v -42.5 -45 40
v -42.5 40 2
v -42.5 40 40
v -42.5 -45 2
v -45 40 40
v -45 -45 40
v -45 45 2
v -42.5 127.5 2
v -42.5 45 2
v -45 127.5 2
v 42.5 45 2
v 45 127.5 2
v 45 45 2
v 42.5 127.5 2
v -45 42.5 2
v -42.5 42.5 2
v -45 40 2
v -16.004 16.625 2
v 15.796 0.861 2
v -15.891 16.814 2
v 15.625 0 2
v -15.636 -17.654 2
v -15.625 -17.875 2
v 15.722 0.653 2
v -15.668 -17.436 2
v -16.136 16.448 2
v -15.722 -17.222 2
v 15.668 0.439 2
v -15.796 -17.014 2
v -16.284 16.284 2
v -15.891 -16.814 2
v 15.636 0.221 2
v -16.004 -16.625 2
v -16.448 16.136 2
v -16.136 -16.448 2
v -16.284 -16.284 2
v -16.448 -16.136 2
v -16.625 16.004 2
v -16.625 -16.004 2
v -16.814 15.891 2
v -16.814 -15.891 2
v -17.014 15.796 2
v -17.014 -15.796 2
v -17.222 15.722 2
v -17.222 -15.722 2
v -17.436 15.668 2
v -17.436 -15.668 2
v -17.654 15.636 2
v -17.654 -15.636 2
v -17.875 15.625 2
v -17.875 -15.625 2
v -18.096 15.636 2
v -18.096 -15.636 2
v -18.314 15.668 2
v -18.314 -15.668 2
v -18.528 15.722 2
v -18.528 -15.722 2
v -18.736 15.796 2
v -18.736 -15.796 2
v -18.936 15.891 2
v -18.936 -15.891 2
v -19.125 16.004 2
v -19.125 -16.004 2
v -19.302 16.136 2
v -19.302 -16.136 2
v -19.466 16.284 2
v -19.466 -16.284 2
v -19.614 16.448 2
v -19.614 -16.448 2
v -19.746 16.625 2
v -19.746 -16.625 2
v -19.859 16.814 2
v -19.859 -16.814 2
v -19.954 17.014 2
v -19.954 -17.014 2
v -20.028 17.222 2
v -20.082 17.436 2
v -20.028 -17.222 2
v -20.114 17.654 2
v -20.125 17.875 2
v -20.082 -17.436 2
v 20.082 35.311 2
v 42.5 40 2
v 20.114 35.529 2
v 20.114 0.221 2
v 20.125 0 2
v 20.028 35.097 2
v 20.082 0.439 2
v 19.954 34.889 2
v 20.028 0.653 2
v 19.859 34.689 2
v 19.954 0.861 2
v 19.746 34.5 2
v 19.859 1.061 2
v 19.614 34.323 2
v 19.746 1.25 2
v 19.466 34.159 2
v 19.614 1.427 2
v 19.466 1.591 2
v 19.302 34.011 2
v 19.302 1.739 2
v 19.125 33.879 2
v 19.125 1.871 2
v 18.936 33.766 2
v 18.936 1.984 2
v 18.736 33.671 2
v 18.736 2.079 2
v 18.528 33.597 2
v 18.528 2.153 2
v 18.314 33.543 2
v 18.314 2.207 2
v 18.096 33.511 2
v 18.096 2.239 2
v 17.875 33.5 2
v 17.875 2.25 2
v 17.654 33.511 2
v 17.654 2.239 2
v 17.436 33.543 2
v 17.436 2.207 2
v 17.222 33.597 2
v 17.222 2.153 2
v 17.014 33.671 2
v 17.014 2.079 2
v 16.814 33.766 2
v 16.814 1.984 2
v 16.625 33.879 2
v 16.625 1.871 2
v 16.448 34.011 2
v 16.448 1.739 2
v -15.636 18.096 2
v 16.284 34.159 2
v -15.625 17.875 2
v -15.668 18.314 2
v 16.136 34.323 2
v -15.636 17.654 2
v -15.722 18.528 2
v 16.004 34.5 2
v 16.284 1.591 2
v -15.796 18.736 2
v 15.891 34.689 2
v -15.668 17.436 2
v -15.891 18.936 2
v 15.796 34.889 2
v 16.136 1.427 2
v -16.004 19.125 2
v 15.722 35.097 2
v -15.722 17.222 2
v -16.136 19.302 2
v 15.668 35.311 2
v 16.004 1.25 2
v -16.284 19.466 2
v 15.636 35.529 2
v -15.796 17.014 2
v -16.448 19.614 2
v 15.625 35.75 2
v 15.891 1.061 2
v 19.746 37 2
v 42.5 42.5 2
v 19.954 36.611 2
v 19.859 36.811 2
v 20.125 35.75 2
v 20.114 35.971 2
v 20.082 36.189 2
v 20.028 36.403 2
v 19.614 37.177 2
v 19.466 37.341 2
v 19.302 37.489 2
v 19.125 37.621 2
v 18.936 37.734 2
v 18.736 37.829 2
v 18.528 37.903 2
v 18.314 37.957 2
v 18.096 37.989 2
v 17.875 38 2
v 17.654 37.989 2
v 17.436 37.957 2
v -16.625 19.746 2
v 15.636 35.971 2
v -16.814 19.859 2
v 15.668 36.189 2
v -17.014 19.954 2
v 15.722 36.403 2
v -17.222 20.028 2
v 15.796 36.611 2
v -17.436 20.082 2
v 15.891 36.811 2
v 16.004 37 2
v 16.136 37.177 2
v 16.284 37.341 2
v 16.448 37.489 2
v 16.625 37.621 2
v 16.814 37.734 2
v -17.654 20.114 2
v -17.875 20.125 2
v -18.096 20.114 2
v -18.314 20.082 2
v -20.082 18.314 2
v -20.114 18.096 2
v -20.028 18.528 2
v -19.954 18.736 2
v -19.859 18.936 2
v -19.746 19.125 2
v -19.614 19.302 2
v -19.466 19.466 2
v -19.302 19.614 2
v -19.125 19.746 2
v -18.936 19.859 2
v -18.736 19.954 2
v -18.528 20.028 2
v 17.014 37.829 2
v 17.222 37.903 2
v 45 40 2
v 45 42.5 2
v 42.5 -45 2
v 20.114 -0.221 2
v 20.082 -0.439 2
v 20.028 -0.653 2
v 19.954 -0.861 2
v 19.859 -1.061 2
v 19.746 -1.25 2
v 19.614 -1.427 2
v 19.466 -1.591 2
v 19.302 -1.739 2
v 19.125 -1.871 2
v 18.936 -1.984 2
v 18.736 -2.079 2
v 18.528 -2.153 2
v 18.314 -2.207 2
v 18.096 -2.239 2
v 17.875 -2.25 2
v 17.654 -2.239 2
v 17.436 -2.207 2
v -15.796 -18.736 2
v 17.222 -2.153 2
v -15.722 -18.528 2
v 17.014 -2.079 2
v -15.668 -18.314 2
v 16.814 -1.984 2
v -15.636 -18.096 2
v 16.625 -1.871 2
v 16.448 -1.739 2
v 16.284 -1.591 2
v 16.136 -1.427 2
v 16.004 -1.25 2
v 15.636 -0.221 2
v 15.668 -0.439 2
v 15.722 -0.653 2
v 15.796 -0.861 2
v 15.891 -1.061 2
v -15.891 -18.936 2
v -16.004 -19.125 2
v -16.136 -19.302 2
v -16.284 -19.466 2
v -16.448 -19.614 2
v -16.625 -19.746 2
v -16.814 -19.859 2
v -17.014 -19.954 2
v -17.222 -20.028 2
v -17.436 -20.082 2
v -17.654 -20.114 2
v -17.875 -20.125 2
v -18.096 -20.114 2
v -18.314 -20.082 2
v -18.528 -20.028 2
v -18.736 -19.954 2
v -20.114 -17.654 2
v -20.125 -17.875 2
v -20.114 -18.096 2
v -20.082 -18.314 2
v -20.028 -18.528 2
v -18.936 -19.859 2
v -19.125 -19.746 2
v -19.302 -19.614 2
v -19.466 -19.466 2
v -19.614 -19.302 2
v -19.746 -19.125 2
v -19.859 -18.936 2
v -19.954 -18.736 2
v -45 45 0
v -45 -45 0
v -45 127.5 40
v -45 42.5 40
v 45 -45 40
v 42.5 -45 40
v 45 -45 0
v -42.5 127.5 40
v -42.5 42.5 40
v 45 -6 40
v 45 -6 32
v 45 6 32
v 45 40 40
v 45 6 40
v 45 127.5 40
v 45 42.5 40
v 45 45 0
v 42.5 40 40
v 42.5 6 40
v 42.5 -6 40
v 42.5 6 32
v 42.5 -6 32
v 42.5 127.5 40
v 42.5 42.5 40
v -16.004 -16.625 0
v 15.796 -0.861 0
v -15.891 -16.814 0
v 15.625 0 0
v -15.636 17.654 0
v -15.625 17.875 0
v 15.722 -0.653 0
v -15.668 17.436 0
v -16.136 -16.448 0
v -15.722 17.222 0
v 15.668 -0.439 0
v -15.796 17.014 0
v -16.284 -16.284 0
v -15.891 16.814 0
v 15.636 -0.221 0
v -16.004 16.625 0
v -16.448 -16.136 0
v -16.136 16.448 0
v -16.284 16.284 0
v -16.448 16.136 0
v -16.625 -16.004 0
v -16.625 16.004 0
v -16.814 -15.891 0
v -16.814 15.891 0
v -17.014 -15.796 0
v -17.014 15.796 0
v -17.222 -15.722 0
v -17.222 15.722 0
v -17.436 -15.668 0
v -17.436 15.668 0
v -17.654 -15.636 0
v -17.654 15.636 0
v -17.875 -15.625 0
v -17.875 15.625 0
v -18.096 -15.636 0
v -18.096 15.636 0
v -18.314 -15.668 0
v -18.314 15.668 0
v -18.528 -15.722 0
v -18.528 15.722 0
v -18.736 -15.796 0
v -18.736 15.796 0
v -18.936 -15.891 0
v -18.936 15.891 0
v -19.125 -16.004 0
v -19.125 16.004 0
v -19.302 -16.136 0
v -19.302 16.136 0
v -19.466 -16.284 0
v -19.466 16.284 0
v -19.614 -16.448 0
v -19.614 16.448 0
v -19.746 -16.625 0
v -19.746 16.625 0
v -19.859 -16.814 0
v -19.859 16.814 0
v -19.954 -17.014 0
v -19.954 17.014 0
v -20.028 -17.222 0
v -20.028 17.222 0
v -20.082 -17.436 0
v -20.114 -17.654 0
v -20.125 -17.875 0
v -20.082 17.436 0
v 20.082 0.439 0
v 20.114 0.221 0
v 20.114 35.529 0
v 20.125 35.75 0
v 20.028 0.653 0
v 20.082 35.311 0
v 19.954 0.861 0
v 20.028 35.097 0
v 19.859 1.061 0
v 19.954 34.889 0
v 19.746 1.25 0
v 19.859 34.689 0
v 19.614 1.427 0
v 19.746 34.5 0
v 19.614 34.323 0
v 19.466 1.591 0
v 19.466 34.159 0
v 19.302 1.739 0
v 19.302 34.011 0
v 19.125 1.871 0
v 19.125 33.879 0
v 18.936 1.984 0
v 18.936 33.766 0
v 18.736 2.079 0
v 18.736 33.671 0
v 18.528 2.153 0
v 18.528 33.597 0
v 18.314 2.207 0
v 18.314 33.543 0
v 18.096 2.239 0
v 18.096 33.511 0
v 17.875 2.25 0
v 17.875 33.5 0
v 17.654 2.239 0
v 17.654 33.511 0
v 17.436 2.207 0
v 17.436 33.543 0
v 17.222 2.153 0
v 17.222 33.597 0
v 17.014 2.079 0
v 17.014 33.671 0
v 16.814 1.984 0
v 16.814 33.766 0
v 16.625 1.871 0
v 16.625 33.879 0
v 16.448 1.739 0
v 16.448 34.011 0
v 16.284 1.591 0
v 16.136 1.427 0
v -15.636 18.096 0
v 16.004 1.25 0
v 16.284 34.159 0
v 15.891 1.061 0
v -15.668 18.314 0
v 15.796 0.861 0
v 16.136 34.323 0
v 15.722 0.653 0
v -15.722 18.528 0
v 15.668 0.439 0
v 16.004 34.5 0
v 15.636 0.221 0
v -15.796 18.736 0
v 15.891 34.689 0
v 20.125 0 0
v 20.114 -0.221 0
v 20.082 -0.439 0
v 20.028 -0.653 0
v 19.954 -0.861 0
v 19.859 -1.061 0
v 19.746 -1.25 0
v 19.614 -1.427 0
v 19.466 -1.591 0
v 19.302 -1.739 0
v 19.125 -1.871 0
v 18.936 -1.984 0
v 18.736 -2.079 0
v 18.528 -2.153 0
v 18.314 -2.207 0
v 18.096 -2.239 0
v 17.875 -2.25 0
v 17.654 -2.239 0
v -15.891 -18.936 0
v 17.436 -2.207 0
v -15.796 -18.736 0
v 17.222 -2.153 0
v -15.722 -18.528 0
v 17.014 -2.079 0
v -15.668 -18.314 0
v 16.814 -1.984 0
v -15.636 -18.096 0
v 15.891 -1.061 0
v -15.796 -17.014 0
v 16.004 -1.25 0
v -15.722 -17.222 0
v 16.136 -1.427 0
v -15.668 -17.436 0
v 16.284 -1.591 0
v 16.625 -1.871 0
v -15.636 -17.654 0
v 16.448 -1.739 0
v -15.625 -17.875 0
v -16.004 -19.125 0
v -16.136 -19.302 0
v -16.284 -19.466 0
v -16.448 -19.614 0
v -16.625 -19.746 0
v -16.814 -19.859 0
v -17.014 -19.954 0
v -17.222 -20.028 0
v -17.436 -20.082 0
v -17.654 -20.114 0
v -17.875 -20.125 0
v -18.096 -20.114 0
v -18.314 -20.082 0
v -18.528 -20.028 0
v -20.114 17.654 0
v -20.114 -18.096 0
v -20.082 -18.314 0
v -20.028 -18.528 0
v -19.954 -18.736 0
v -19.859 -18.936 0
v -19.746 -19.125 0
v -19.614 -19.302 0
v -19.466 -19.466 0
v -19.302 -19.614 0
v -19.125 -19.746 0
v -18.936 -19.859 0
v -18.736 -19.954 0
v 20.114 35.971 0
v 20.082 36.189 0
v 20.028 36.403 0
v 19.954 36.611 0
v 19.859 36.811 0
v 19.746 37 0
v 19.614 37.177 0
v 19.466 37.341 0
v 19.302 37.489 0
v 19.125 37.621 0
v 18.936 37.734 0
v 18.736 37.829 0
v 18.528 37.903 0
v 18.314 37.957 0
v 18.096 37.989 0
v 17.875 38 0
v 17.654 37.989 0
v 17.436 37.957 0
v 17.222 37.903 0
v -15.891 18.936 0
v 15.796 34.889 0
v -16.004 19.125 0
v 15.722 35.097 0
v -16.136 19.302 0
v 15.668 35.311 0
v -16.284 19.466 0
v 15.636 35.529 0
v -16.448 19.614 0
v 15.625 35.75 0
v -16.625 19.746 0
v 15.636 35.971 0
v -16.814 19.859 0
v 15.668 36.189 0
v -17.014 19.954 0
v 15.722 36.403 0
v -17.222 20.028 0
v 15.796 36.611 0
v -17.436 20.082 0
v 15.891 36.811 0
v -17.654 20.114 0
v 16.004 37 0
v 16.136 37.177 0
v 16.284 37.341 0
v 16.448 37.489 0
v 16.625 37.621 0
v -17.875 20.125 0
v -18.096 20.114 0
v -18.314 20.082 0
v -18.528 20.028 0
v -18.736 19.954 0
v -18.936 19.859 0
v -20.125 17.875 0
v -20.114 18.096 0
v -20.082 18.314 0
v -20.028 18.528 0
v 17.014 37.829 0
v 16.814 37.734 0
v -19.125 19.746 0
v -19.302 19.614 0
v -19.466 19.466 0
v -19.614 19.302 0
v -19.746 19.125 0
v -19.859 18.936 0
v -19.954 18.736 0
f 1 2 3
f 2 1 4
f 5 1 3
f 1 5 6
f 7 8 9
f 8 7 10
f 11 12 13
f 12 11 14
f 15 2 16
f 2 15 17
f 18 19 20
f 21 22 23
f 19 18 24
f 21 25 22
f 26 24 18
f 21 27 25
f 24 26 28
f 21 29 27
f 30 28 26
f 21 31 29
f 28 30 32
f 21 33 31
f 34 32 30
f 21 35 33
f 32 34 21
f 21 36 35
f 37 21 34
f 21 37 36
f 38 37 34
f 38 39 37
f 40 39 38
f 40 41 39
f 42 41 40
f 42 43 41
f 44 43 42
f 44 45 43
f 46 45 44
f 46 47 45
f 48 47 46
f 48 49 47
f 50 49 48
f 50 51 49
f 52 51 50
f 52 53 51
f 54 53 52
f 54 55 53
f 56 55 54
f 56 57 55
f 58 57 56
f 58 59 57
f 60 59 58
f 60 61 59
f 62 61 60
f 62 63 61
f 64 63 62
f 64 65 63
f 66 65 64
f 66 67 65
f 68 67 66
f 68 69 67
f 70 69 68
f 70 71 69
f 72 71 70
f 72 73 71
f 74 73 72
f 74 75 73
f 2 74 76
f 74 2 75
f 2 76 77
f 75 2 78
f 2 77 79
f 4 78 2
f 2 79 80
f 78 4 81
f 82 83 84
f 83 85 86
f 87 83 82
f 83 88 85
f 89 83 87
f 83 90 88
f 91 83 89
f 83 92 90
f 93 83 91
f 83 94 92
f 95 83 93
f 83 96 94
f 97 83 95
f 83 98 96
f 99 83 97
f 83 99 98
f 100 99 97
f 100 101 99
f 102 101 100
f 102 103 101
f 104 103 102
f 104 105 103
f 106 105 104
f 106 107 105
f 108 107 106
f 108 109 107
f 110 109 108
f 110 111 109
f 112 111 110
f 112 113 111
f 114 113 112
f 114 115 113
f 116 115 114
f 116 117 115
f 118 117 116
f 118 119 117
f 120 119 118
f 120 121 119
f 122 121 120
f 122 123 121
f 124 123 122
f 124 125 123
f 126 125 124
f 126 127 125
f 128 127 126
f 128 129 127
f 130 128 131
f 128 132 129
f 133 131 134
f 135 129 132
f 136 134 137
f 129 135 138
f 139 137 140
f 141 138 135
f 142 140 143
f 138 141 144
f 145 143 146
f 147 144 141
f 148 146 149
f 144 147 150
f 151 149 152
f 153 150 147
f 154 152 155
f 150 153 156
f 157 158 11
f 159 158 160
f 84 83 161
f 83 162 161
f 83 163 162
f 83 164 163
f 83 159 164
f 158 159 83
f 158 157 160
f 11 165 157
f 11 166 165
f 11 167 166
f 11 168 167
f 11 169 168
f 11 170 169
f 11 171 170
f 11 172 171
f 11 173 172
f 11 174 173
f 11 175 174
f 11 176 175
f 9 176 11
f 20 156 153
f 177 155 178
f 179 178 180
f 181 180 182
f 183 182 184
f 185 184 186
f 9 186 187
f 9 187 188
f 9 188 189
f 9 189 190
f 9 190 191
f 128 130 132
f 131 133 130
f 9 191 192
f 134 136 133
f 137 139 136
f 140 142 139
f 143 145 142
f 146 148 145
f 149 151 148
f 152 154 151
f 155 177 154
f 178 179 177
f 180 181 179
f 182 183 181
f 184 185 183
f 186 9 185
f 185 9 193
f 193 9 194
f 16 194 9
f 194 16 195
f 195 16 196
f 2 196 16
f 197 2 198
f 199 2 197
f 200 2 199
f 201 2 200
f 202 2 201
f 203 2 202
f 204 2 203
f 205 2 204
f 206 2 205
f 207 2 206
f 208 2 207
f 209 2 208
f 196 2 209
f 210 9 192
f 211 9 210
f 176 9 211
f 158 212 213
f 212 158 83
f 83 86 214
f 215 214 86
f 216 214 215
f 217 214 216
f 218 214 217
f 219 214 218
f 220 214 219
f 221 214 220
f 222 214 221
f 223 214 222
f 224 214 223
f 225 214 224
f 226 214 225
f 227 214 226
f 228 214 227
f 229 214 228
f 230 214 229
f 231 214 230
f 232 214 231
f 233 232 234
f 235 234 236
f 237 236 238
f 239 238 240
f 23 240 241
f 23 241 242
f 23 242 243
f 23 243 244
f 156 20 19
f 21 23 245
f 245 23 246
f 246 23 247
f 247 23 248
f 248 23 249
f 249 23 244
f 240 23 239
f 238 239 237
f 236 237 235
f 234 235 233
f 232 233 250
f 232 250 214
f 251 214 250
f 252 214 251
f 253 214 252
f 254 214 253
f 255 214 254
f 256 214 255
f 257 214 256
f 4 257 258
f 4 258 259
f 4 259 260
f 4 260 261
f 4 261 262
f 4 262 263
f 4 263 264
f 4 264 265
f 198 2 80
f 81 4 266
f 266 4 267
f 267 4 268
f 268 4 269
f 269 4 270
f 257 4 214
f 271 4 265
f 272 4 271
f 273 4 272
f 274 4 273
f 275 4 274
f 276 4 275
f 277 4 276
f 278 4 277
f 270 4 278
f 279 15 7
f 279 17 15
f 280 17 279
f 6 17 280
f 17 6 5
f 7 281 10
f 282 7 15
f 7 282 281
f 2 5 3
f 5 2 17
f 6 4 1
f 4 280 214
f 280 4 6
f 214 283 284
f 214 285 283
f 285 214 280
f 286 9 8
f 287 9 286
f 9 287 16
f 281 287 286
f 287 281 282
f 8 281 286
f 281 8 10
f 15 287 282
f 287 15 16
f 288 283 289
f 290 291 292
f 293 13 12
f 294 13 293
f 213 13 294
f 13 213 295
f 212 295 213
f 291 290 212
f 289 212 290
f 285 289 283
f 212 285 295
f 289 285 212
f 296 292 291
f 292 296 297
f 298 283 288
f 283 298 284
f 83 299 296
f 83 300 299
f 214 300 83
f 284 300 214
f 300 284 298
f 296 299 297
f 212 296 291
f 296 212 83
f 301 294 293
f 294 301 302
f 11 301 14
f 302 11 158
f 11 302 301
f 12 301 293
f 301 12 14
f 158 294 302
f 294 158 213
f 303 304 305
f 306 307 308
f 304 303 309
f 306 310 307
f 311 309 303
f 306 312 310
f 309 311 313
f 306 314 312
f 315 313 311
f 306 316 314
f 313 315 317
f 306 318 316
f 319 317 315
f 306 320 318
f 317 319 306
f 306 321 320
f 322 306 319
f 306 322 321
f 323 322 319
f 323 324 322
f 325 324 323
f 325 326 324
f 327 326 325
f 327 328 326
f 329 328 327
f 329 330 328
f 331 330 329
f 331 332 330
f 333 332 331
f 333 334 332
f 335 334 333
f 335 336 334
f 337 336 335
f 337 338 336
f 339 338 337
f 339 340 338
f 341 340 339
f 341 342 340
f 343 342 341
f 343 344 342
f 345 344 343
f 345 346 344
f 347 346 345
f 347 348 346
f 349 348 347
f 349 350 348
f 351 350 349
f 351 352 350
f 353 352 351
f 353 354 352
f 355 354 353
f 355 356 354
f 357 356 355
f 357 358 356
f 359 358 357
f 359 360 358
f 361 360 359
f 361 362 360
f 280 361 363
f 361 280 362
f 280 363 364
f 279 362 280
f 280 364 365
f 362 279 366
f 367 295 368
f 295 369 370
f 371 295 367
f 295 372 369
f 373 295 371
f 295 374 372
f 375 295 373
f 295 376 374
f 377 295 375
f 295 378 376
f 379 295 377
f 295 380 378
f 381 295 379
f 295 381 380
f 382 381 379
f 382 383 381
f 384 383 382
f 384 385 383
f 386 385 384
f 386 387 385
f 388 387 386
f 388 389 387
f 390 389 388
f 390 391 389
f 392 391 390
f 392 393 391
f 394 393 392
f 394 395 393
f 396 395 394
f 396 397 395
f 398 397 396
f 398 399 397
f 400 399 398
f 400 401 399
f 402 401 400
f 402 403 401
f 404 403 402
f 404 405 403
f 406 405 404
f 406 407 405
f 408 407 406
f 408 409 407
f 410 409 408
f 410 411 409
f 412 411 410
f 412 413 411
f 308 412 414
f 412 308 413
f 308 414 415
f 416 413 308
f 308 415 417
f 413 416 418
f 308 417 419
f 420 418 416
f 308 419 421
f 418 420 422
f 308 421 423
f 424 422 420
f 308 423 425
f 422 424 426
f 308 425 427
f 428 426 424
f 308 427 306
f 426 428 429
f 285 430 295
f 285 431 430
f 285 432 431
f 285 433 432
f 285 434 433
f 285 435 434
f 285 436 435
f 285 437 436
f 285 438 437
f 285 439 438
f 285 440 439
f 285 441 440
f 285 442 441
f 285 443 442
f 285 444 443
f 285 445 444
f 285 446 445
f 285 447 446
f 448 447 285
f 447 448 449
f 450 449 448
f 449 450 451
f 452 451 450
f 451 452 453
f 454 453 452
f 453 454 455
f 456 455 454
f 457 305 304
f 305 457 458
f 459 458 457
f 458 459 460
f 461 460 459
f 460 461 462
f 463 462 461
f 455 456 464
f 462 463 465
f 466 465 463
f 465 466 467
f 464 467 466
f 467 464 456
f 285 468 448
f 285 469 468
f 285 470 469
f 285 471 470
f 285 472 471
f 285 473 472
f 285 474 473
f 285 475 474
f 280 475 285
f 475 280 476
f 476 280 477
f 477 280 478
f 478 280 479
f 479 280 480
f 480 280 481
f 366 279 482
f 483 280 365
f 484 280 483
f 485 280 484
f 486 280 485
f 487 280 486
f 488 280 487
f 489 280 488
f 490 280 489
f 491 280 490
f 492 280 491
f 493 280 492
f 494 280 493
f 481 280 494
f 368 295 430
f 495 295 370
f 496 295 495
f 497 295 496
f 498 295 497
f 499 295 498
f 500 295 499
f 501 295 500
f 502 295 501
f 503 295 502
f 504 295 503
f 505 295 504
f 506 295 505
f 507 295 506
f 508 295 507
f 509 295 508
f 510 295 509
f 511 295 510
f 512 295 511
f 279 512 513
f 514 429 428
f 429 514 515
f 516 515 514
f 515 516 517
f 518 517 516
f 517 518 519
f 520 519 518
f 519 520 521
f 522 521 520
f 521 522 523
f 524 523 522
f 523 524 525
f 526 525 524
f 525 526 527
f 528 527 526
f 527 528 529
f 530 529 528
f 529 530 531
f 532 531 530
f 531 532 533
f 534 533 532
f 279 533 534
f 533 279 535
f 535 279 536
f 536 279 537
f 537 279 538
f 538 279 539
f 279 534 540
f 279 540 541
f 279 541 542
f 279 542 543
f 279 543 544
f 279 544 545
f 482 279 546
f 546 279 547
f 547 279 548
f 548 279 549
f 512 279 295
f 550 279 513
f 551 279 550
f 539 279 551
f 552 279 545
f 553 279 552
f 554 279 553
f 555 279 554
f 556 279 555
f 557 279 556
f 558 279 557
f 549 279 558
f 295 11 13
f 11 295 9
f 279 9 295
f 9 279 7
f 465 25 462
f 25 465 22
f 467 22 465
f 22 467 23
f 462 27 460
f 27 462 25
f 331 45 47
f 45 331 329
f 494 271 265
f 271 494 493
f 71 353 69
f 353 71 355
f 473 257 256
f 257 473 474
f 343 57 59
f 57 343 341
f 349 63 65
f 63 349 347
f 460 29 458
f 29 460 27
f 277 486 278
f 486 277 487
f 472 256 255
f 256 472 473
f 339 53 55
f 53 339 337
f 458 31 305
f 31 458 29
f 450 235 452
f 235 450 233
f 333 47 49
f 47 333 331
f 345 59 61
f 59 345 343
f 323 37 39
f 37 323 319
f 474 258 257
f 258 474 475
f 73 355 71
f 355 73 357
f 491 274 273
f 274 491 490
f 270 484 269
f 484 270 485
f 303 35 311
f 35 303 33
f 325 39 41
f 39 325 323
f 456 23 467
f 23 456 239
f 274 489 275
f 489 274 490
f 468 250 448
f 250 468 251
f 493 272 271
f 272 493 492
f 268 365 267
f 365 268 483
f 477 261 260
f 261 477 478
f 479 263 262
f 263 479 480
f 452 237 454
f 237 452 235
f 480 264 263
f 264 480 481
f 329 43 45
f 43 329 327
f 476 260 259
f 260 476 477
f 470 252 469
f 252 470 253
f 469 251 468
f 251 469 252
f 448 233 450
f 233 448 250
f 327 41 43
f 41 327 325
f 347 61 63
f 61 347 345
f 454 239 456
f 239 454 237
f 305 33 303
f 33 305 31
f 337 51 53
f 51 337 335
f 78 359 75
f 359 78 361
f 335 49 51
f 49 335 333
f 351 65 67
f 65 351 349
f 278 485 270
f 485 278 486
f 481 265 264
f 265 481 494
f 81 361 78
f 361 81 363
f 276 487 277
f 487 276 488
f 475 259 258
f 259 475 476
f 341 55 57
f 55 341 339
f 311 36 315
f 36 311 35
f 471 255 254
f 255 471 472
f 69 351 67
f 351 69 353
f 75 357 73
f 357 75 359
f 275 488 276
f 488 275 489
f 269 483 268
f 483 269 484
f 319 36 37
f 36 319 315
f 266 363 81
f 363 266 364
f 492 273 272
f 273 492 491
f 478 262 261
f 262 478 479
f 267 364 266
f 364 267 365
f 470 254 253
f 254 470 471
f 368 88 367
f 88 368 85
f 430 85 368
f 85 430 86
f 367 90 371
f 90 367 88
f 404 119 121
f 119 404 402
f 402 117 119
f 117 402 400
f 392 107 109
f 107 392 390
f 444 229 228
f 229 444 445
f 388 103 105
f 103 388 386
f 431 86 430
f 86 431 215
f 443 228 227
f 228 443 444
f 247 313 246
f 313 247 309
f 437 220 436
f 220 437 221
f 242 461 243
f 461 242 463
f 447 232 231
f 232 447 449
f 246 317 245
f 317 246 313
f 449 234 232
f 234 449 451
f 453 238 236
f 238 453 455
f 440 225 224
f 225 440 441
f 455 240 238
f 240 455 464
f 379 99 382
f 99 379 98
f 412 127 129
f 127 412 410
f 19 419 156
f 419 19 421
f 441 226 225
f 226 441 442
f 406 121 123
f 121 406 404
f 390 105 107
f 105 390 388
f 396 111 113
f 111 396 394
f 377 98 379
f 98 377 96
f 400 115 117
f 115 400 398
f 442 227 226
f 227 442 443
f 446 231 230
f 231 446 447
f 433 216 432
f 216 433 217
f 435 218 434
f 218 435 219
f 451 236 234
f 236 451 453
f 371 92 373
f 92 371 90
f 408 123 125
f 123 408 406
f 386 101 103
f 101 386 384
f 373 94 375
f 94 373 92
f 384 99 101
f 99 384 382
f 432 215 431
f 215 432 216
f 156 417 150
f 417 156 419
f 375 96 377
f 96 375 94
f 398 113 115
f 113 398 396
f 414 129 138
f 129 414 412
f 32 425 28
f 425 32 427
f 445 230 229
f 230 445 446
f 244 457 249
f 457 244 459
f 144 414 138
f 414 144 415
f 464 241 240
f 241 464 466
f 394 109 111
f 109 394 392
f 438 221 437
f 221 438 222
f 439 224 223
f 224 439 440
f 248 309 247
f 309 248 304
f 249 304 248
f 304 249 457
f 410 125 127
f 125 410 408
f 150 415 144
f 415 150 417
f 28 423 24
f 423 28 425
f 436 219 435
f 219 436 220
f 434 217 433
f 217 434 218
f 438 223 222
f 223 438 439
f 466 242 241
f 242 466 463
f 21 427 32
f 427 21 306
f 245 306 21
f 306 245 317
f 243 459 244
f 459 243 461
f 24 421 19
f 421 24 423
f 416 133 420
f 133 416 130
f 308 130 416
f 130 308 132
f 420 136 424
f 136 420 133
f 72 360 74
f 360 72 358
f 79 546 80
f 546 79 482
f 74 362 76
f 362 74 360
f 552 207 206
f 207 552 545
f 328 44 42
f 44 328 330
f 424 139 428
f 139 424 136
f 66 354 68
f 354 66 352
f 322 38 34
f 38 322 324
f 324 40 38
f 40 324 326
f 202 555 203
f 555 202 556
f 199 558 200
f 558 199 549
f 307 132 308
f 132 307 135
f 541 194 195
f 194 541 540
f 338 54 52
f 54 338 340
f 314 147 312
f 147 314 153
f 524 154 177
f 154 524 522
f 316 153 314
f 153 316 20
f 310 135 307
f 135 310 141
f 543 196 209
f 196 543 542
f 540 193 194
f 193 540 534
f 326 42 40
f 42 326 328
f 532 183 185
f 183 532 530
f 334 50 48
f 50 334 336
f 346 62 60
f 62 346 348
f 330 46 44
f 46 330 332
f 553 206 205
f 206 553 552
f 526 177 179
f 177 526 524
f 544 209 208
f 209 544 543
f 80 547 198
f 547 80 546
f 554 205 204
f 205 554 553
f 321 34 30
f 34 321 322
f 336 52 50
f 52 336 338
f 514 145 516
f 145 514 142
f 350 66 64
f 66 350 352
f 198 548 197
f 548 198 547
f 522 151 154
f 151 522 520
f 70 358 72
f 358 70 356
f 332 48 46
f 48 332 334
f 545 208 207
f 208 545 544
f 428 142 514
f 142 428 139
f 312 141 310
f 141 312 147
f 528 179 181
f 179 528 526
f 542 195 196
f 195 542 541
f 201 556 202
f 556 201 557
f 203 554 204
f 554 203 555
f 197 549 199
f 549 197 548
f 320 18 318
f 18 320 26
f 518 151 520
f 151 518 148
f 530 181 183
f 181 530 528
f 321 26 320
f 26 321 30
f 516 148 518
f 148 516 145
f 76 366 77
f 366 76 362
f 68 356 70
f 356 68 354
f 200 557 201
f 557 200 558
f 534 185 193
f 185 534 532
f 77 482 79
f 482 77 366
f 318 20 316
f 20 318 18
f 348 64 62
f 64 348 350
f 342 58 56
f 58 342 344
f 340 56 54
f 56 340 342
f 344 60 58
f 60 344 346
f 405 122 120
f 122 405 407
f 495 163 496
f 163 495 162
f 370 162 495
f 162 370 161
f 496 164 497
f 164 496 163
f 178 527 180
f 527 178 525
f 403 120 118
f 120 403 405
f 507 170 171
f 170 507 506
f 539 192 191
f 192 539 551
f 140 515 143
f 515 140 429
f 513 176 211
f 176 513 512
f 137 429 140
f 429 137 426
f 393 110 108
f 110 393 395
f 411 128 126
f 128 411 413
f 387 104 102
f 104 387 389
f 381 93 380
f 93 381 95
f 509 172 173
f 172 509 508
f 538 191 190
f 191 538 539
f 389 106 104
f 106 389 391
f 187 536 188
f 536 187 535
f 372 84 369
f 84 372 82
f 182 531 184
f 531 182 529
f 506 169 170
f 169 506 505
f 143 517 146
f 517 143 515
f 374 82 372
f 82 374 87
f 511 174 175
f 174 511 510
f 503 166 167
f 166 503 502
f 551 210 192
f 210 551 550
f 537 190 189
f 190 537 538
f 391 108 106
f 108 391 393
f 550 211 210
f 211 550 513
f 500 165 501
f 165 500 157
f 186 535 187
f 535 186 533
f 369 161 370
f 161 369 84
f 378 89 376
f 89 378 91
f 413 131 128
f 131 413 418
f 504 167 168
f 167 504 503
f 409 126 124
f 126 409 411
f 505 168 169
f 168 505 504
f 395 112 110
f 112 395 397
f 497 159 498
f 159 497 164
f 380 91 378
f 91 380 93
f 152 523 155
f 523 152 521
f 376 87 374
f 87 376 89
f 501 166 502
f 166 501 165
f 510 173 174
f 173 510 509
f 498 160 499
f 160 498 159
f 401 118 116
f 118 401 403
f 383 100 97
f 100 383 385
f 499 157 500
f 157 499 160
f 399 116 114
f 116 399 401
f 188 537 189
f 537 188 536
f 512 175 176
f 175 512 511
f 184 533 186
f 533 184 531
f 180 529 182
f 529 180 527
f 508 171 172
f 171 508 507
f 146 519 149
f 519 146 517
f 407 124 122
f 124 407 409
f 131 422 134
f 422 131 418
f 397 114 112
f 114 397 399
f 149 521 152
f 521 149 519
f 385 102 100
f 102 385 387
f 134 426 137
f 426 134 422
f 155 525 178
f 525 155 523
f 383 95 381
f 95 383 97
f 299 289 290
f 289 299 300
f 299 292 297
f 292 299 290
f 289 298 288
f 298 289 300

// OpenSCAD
// Magnetic stirrer housing - open box covering an 80 mm PC case fan
// Print orientation: top plate on bed (z = 0), walls rise to open top (z = 40)

// ---------- Parameters ----------
outer_x      = 90;    // outer size in X (mm)
outer_y      = 90;    // outer size in Y (mm)
plate_t      = 2;     // top plate thickness (mm), z = 0..2
wall_t       = 2.5;   // wall thickness (mm), z = 2..40
open_top_z   = 40;    // height of open top (mm)
screw_holes  = 4;     // number of M4 screw holes
screw_d      = 4.5;   // screw hole diameter (mm)
screw_pitch  = 71.5;  // square pattern size between holes (mm)
notch_w      = 12;    // cable notch width (mm)
notch_bottom = 8;     // notch depth from open edge (mm), z = 32..40

eps          = 0.5;   // cutter overshoot past faces (mm)

$fn = 64;

// ---------- Model ----------
difference() {
    union() {
        // Top plate
        translate([-outer_x/2, -outer_y/2, 0])
            cube([outer_x, outer_y, plate_t]);

        // Four walls, open top
        for (sx = [-1, 1], sy = [-1, 1])
            translate([sx > 0 ? outer_x/2 - wall_t : -outer_x/2,
                       sy > 0 ? outer_y/2 - wall_t : -outer_y/2,
                       plate_t])
                cube([wall_t, outer_y - 2*wall_t, open_top_z - plate_t]);
    }

    // Screw holes through top plate
    for (i = [0 : screw_holes - 1]) {
        a = screw_pitch / 2;
        x = (i % 2) * a - a / 2;
        y = (i / 2) * a - a / 2;
        translate([x, y, -eps])
            cylinder(d = screw_d, h = plate_t + 2 * eps);
    }

    // Cable notch in one wall (along +X wall, centred in Y)
    translate([outer_x/2 - wall_t, -notch_w/2, open_top_z - notch_bottom])
        cube([wall_t + eps, notch_w, notch_bottom + eps]);
}
